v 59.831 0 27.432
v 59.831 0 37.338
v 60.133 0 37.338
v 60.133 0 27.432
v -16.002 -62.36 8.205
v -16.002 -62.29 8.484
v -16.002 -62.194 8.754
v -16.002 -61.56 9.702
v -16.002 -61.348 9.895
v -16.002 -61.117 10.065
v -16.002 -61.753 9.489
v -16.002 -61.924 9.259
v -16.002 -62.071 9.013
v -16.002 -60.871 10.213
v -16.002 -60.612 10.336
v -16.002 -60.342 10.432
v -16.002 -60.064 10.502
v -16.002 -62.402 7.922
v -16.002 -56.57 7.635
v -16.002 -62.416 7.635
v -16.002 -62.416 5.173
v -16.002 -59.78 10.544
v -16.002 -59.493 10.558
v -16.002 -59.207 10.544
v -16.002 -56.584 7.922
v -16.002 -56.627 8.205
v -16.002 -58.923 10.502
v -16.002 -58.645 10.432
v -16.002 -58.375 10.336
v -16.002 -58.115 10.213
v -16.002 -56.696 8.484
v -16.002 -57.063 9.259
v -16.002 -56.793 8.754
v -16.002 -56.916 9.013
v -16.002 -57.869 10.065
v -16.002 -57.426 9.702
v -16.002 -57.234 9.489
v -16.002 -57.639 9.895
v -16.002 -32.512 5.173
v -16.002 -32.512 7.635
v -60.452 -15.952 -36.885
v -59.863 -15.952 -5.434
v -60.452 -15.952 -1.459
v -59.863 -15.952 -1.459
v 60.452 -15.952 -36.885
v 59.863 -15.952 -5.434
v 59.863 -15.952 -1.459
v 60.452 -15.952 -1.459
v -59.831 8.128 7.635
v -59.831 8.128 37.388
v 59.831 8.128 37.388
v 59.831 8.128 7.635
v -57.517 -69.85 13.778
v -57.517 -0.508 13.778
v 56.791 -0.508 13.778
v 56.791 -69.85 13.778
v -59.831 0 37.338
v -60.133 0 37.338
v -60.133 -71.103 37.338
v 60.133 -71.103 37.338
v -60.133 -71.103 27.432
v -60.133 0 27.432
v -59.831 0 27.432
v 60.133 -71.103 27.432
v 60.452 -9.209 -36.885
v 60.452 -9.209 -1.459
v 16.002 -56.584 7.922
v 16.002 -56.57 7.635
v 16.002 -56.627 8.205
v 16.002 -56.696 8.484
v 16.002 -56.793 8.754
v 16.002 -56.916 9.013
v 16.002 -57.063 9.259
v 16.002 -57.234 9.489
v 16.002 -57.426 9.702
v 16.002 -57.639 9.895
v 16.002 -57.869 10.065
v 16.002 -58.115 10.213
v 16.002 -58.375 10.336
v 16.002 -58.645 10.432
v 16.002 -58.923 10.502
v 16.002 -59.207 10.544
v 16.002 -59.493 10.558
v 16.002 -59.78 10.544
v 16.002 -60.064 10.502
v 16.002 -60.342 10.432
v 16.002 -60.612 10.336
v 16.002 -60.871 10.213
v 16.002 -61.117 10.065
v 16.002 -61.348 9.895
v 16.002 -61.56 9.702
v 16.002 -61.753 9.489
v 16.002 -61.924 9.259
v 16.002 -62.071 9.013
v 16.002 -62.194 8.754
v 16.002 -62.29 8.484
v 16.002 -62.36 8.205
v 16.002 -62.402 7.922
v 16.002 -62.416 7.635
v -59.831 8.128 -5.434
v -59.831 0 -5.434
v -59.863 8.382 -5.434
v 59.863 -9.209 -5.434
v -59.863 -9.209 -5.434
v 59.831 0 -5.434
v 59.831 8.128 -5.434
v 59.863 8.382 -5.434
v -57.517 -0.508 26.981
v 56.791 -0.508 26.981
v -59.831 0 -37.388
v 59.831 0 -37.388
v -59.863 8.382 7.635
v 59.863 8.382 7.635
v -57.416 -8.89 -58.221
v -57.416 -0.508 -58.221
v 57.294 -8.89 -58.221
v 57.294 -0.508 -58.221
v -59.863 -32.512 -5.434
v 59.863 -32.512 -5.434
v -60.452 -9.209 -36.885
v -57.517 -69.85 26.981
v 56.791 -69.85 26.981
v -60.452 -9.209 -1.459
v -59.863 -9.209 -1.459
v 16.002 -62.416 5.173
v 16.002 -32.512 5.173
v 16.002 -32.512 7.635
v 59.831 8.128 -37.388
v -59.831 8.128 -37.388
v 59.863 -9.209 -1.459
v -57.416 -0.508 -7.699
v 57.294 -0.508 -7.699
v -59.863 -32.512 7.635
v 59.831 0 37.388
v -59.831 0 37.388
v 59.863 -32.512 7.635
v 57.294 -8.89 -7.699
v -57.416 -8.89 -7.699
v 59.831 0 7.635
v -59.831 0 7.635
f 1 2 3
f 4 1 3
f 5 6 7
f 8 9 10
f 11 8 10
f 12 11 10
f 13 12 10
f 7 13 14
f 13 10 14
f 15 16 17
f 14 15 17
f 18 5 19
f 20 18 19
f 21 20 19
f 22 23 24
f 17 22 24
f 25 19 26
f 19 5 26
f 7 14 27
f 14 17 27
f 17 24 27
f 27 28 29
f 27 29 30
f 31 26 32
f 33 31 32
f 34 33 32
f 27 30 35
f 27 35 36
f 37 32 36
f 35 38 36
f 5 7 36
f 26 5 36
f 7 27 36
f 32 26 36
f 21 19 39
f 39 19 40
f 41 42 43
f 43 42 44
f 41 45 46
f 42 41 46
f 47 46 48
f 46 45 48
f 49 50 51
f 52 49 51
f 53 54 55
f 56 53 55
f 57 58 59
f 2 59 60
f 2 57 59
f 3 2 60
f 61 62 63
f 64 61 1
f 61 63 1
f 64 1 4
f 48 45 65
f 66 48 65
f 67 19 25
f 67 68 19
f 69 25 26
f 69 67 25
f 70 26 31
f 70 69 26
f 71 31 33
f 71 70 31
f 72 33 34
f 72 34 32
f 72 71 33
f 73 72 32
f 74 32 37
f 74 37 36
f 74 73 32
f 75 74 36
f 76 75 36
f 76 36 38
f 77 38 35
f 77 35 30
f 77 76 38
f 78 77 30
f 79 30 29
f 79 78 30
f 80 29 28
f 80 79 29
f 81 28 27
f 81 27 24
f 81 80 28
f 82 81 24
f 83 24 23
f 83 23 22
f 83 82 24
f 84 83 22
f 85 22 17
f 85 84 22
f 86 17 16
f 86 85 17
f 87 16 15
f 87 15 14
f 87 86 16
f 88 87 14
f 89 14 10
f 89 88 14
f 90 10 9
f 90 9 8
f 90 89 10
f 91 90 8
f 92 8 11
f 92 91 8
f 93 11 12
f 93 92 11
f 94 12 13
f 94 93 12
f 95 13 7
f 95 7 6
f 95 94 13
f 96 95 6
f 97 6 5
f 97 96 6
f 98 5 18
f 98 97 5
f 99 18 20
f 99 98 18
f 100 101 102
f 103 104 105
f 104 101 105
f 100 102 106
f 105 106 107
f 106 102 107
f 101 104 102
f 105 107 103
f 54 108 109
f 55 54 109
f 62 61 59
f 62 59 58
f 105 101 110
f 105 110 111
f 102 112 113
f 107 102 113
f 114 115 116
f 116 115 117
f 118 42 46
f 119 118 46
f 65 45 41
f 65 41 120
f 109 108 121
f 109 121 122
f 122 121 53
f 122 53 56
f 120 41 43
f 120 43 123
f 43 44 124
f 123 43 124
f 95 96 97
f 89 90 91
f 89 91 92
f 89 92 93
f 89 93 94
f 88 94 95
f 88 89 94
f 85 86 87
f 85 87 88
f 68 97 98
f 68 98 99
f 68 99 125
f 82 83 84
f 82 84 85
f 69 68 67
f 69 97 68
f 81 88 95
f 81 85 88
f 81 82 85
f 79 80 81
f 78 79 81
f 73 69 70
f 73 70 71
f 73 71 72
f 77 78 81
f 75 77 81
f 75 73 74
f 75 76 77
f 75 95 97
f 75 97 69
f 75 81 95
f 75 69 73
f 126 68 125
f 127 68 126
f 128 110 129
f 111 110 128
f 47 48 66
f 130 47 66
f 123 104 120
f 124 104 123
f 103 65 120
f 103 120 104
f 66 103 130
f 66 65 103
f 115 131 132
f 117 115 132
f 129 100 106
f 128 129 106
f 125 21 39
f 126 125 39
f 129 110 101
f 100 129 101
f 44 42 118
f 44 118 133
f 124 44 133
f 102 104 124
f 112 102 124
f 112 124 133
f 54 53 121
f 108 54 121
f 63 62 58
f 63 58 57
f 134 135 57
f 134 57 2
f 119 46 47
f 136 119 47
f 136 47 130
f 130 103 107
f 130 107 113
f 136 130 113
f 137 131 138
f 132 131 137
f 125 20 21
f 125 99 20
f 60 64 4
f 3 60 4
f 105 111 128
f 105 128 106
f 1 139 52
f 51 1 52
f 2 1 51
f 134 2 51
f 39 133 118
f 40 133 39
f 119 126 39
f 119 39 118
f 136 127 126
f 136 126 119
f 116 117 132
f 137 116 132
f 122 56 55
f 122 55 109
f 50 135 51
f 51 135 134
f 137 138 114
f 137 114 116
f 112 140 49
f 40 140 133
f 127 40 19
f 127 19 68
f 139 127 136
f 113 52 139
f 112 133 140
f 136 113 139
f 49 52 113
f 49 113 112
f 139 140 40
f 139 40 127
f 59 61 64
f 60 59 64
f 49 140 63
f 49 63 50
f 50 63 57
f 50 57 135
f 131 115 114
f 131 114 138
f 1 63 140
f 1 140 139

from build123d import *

# Parameters (mm, degrees)
F0_W      = 119.6627616882
F0_H      = 74.7766420245
F1_DEPTH  = 8.128
F3_W      = 119.7266131639
F3_H      = 13.0689910729
F4_DEPTH  = 40.894
F5_W      = 6.7429840565
F5_H      = 35.425810609
F6_DEPTH  = 60.452
F8_START  = 27.432
F7_W      = 120.2666014433
F7_H      = 71.1032301188
F8_DEPTH  = 9.906
F10_START = 0.508
F9_W      = 114.7100962698
F9_H      = 50.5220373161
F10_DEPTH = 8.382
F12_START = 0.508
F11_W     = 114.3076792359
F11_H     = 13.2031459361
F12_DEPTH = 69.342
F14_DEPTH = 16.002


with BuildPart() as f1:
    # F0 (on Front) → F1 (new body)
    with BuildSketch(Plane.XZ):
        Rectangle(F0_W, F0_H)
    extrude(amount=-F1_DEPTH)

    # F3 (on offset) → F4 (join)
    with BuildSketch(Plane.XZ.offset(-8.382)):
        with Locations((0, 1.1006427521)):
            Rectangle(F3_W, F3_H)
    extrude(amount=F4_DEPTH)

    # F5 (on Right) → F6 (join, symmetric)
    with BuildSketch(Plane.YZ):
        with Locations((-12.5801898539, -19.1722072195)):
            Rectangle(F5_W, F5_H)
    extrude(amount=F6_DEPTH, both=True)

    # F7 (on Top) → F8 (join)
    with BuildSketch(Plane.XY.offset(F8_START)):
        with Locations((0, -35.5516150594)):
            Rectangle(F7_W, F7_H)
    extrude(amount=F8_DEPTH)

    # F13 (on Right) → F14 (join, symmetric)
    with BuildSketch(Plane.YZ):
        Polygon((-62.4162591994, 5.1726119709), (-32.512, 5.1726119709), (-32.512, 7.6351382885), (-56.5703772008, 7.6351382885), (-62.4162591994, 7.6351382885), align=None)
        with BuildLine():
            Line((-62.4162591994, 7.6351382885), (-56.5703772008, 7.6351382885))
            ThreePointArc((-56.5703772008, 7.6351382885), (-59.4933182001, 10.5580792878), (-62.4162591994, 7.6351382885))
        make_face()
    extrude(amount=F14_DEPTH, both=True)


with BuildPart() as f10:
    # F9 (on Front) → F10 (new body)
    with BuildSketch(Plane.XZ.offset(F10_START)):
        with Locations((-0.0609327108, -32.9600942787)):
            Rectangle(F9_W, F9_H)
    extrude(amount=F10_DEPTH)


with BuildPart() as f12:
    # F11 (on Front) → F12 (new body)
    with BuildSketch(Plane.XZ.offset(F12_START)):
        with Locations((-0.3627836704, 20.3791270033)):
            Rectangle(F11_W, F11_H)
    extrude(amount=F12_DEPTH)


solid = Compound([f1.part, f10.part, f12.part])
